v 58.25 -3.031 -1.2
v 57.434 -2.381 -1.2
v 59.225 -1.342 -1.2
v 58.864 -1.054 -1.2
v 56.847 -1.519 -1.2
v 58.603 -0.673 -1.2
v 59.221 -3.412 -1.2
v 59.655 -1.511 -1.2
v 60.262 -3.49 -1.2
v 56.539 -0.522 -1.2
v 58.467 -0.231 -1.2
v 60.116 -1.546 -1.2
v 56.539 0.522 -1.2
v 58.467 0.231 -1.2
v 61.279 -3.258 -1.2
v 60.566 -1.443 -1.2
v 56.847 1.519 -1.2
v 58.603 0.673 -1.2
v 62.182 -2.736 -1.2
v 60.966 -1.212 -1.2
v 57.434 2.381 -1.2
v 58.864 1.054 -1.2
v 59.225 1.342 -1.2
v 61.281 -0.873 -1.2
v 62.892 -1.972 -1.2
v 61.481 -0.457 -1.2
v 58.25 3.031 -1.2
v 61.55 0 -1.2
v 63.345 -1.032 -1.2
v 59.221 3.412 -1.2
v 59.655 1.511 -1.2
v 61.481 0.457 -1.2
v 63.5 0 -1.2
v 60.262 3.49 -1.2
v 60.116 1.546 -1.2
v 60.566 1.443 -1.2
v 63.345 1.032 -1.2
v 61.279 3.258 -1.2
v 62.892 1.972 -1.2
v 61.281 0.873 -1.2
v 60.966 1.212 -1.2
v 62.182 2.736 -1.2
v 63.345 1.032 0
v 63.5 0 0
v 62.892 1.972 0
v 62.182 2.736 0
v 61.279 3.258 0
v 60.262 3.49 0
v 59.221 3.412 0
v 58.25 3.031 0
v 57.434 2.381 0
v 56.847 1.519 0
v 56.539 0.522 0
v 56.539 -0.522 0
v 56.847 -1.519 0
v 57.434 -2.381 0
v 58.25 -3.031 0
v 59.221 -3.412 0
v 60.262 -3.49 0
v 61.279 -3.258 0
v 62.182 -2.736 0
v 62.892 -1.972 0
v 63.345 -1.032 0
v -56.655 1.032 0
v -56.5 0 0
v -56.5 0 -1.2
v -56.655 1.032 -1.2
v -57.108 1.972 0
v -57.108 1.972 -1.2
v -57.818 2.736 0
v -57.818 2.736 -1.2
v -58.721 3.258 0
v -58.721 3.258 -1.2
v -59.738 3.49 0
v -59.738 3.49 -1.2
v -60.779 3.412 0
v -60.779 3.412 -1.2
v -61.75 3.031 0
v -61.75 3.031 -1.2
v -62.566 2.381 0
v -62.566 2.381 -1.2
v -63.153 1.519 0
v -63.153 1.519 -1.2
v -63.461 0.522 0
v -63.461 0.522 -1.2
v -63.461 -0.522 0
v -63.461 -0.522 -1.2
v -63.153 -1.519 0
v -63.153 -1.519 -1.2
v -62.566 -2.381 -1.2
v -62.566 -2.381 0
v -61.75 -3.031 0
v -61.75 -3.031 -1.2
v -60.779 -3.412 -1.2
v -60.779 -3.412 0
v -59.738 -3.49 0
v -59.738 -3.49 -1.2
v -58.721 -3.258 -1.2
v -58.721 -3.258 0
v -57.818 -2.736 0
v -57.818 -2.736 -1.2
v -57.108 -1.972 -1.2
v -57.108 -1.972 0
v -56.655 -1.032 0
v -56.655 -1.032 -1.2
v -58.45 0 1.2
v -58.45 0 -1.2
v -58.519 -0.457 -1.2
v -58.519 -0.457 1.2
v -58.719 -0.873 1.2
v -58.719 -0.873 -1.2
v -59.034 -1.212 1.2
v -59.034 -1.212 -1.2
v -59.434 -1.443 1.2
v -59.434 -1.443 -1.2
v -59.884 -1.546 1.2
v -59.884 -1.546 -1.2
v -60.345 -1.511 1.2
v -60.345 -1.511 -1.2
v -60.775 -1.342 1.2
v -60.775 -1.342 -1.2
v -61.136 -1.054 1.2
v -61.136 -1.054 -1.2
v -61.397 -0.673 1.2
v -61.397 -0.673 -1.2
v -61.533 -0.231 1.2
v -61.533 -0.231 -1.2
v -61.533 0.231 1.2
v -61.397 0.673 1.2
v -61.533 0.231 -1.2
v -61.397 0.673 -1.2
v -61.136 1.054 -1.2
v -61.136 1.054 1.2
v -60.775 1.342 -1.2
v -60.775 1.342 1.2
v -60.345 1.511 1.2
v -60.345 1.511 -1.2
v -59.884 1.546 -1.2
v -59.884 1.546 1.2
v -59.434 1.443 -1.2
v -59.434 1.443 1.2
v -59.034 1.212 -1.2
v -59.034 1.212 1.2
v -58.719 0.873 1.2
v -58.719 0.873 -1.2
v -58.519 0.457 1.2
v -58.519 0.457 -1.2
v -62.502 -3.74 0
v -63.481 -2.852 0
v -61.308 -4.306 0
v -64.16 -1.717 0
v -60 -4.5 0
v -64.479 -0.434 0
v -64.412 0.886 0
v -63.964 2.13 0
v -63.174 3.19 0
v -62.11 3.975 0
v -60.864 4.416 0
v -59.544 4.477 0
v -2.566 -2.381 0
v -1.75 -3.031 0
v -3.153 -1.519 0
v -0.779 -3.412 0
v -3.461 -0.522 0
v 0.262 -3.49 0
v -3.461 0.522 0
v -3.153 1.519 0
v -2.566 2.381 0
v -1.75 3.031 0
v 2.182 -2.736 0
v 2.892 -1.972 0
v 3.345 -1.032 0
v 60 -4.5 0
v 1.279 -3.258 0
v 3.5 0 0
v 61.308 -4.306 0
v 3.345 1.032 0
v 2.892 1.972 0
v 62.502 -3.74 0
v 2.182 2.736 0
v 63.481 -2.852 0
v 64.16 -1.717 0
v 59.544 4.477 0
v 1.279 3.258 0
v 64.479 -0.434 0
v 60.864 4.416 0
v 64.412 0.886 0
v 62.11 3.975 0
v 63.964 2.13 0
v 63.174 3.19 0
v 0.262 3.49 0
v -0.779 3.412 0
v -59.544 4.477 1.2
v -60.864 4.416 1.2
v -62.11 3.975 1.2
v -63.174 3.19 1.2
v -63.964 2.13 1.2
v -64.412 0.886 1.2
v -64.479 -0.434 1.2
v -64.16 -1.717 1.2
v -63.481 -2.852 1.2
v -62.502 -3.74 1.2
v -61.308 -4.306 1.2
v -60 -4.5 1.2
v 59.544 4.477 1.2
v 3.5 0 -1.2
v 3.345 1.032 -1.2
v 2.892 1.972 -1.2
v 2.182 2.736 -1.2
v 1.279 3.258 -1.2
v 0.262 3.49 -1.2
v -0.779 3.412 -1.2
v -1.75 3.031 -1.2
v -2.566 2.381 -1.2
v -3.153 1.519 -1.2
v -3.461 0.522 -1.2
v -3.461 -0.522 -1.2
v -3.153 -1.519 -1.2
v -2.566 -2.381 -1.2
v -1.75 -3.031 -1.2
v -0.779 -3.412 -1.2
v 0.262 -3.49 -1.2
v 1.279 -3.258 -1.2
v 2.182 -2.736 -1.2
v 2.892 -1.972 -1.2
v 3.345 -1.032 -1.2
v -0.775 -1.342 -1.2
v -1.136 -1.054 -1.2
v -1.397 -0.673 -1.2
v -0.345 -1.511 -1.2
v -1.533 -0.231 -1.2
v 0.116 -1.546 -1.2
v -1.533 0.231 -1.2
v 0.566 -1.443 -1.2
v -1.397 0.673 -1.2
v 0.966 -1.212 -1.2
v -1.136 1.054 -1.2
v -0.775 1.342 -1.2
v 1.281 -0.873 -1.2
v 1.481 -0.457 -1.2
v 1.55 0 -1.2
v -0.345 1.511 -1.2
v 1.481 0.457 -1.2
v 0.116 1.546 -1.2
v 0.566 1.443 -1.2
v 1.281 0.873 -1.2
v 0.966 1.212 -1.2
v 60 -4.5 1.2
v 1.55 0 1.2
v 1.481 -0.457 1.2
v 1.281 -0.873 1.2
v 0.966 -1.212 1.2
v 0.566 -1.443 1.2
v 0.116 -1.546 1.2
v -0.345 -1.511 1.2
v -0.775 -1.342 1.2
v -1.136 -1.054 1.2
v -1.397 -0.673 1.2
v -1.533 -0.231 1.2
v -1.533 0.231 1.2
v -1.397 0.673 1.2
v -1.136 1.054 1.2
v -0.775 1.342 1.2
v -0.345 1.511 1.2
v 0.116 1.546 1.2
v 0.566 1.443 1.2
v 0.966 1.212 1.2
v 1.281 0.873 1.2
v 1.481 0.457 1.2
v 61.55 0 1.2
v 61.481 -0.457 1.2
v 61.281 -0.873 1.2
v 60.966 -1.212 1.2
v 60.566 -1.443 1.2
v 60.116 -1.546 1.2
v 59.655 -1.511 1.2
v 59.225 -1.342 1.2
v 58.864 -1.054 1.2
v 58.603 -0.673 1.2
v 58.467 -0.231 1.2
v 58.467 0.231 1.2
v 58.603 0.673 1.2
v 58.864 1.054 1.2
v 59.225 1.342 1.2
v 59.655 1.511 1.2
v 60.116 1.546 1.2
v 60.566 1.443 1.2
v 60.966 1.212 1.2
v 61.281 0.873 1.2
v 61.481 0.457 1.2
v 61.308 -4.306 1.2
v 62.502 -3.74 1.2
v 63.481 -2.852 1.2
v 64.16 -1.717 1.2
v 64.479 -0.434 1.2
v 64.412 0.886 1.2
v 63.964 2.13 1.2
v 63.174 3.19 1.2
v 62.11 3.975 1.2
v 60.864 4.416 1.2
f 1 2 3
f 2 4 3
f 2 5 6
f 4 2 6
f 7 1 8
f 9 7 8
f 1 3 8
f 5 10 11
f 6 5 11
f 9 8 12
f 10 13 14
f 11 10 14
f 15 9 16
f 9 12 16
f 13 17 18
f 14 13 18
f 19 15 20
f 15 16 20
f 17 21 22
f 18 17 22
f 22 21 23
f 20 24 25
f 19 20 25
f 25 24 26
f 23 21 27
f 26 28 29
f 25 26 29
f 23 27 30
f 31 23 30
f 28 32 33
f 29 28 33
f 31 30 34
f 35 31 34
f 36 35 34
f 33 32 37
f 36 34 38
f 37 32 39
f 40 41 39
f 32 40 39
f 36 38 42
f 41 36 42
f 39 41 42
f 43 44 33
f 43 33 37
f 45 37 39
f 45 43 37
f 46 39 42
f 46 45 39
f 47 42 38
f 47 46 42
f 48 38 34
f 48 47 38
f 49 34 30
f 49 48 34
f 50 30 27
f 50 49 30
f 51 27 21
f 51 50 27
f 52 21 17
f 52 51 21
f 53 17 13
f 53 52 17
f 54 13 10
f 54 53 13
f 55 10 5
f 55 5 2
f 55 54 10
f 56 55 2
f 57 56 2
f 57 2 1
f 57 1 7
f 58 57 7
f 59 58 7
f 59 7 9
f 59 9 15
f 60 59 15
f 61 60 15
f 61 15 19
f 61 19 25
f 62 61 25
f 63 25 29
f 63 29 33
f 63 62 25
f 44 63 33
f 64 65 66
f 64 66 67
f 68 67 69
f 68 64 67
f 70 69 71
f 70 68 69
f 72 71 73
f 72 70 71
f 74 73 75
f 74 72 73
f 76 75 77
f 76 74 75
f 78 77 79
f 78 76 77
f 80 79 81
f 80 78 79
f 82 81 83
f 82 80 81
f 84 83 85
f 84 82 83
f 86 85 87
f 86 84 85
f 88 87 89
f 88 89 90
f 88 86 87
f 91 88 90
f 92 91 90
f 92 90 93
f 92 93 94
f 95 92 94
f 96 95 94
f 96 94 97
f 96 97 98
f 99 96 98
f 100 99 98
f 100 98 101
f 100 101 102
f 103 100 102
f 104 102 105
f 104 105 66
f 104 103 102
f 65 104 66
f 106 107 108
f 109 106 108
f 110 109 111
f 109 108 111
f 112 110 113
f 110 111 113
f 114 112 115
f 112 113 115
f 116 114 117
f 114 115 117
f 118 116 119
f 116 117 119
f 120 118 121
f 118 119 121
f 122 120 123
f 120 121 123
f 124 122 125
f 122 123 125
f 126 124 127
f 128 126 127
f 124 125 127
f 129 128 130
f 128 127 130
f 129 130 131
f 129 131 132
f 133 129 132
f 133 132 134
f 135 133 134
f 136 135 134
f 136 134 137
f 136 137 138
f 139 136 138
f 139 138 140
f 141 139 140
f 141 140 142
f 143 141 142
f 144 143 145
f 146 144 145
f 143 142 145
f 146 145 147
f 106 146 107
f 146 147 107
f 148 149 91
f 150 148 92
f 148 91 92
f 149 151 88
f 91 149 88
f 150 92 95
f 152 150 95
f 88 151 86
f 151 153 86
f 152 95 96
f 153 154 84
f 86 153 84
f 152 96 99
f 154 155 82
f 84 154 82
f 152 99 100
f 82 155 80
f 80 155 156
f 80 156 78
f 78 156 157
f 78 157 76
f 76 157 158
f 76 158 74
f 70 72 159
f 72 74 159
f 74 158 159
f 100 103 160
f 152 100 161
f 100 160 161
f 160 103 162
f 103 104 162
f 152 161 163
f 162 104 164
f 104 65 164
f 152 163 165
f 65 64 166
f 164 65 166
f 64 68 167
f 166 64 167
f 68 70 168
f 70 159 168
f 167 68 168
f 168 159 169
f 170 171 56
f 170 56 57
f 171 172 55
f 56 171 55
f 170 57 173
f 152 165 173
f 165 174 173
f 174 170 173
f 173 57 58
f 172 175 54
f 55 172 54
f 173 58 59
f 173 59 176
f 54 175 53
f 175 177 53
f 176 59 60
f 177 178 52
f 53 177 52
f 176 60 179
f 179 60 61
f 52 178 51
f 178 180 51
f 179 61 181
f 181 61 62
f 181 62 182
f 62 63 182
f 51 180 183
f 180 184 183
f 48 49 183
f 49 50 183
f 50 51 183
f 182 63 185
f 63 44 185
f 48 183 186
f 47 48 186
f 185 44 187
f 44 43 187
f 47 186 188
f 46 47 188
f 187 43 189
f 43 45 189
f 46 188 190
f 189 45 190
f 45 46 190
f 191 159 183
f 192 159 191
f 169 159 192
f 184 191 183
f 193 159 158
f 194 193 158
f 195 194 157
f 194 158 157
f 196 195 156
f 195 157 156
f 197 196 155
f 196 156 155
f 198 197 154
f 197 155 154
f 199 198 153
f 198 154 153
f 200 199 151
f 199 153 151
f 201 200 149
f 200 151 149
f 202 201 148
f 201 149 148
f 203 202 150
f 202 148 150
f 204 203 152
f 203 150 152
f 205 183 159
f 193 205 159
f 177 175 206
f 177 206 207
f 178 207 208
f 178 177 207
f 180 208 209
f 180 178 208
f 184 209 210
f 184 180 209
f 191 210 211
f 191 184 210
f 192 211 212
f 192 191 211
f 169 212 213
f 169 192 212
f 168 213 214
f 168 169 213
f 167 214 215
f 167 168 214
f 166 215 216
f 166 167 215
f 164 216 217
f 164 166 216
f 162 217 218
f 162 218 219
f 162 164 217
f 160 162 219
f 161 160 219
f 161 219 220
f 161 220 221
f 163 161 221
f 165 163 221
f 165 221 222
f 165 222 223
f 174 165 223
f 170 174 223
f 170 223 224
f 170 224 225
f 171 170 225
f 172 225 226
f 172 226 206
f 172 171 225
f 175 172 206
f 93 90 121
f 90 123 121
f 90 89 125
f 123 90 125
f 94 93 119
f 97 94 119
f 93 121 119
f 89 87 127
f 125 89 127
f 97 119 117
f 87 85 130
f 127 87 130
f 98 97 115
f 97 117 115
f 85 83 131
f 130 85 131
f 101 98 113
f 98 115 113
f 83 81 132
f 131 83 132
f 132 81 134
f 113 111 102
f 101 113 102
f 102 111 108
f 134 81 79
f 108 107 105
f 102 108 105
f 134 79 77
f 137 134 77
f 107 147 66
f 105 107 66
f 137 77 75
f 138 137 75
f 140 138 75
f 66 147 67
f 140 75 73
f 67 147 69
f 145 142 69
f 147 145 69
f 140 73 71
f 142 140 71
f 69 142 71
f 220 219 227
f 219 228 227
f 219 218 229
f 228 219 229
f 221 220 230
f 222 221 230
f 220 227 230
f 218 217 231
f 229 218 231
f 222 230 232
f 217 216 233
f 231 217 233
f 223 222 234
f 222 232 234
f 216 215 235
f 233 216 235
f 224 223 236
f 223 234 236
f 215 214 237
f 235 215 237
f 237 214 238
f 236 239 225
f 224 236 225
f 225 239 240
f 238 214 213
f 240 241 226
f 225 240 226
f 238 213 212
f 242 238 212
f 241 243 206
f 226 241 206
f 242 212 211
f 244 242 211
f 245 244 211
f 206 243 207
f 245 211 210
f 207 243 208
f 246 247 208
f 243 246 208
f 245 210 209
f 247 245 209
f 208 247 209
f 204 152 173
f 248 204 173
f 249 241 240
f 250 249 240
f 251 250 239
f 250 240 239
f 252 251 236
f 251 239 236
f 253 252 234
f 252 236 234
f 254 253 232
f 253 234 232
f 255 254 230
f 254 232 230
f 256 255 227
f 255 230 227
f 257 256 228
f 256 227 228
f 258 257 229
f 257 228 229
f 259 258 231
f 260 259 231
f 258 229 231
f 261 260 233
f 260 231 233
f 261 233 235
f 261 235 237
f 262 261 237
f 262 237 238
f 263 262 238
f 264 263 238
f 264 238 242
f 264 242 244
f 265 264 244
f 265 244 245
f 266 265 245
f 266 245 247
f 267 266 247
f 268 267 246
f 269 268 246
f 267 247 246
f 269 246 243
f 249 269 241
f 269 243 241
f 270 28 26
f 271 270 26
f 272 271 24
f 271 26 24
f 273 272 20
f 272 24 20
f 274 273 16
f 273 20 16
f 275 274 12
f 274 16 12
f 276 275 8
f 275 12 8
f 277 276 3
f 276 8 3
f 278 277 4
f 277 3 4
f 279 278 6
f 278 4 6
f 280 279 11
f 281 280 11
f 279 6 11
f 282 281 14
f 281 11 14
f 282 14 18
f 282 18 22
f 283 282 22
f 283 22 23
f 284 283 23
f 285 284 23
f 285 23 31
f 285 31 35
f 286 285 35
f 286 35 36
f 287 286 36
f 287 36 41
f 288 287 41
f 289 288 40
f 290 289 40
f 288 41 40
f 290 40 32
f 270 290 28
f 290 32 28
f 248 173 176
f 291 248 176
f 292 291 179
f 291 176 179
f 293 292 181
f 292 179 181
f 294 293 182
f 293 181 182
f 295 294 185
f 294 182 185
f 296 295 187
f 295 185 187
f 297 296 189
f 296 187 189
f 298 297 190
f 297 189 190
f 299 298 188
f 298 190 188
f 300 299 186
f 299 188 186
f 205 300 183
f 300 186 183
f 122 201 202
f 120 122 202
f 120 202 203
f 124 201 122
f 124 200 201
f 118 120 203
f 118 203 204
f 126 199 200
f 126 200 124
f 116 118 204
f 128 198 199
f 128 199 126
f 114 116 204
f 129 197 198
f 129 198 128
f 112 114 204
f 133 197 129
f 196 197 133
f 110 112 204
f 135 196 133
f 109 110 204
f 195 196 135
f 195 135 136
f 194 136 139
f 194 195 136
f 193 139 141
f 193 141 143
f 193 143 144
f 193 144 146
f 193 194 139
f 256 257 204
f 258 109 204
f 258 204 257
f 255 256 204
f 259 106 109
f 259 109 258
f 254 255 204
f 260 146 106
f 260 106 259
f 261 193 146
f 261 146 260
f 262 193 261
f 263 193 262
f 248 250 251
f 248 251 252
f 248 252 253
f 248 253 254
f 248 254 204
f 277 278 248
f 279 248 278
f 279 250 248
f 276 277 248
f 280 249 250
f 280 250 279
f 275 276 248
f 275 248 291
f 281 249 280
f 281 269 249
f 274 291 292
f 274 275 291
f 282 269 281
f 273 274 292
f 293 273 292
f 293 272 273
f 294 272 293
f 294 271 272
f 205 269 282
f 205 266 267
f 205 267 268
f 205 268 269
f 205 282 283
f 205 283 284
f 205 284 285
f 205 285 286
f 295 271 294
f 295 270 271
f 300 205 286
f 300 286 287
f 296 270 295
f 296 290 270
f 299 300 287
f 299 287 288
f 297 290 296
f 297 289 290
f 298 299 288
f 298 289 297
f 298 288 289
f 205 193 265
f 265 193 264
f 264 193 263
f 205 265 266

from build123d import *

# Parameters (mm, degrees)
F1_DEPTH = 1.2
F2_R     = 3.5
F3_DEPTH = 1.2
F4_R     = 1.55
F5_DEPTH = 2.4


with BuildPart() as f1:
    # F0 (on Top) → F1 (new body)
    with BuildSketch(Plane.XY):
        with BuildLine():
            Line((59.5437594947, 4.4768118791), (-59.5437594947, 4.4768118791))
            ThreePointArc((-59.5437594947, 4.4768118791), (-64.494199231, 0.2284146929), (-60, -4.5))
            Line((-60, -4.5), (60, -4.5))
            ThreePointArc((60, -4.5), (64.494199231, 0.2284146929), (59.5437594947, 4.4768118791))
        make_face()
    extrude(amount=F1_DEPTH)

    # F2 (on face) → F3 (join)
    with BuildSketch(Plane.XY):
        with Locations((-60, 0)):
            Circle(F2_R)
        Circle(F2_R)
        with Locations((60, 0)):
            Circle(F2_R)
    extrude(amount=-F3_DEPTH)

    # F4 (on face) → F5 (cut, through all)
    with BuildSketch(Plane(origin=(0, 0, -1.2), x_dir=(1, 0, 0), z_dir=(0, 0, -1))):
        with Locations((60, 0)):
            Circle(F4_R)
        Circle(F4_R)
        with Locations((-60, 0)):
            Circle(F4_R)
    extrude(amount=-F5_DEPTH, mode=Mode.SUBTRACT)


solid = f1.part
